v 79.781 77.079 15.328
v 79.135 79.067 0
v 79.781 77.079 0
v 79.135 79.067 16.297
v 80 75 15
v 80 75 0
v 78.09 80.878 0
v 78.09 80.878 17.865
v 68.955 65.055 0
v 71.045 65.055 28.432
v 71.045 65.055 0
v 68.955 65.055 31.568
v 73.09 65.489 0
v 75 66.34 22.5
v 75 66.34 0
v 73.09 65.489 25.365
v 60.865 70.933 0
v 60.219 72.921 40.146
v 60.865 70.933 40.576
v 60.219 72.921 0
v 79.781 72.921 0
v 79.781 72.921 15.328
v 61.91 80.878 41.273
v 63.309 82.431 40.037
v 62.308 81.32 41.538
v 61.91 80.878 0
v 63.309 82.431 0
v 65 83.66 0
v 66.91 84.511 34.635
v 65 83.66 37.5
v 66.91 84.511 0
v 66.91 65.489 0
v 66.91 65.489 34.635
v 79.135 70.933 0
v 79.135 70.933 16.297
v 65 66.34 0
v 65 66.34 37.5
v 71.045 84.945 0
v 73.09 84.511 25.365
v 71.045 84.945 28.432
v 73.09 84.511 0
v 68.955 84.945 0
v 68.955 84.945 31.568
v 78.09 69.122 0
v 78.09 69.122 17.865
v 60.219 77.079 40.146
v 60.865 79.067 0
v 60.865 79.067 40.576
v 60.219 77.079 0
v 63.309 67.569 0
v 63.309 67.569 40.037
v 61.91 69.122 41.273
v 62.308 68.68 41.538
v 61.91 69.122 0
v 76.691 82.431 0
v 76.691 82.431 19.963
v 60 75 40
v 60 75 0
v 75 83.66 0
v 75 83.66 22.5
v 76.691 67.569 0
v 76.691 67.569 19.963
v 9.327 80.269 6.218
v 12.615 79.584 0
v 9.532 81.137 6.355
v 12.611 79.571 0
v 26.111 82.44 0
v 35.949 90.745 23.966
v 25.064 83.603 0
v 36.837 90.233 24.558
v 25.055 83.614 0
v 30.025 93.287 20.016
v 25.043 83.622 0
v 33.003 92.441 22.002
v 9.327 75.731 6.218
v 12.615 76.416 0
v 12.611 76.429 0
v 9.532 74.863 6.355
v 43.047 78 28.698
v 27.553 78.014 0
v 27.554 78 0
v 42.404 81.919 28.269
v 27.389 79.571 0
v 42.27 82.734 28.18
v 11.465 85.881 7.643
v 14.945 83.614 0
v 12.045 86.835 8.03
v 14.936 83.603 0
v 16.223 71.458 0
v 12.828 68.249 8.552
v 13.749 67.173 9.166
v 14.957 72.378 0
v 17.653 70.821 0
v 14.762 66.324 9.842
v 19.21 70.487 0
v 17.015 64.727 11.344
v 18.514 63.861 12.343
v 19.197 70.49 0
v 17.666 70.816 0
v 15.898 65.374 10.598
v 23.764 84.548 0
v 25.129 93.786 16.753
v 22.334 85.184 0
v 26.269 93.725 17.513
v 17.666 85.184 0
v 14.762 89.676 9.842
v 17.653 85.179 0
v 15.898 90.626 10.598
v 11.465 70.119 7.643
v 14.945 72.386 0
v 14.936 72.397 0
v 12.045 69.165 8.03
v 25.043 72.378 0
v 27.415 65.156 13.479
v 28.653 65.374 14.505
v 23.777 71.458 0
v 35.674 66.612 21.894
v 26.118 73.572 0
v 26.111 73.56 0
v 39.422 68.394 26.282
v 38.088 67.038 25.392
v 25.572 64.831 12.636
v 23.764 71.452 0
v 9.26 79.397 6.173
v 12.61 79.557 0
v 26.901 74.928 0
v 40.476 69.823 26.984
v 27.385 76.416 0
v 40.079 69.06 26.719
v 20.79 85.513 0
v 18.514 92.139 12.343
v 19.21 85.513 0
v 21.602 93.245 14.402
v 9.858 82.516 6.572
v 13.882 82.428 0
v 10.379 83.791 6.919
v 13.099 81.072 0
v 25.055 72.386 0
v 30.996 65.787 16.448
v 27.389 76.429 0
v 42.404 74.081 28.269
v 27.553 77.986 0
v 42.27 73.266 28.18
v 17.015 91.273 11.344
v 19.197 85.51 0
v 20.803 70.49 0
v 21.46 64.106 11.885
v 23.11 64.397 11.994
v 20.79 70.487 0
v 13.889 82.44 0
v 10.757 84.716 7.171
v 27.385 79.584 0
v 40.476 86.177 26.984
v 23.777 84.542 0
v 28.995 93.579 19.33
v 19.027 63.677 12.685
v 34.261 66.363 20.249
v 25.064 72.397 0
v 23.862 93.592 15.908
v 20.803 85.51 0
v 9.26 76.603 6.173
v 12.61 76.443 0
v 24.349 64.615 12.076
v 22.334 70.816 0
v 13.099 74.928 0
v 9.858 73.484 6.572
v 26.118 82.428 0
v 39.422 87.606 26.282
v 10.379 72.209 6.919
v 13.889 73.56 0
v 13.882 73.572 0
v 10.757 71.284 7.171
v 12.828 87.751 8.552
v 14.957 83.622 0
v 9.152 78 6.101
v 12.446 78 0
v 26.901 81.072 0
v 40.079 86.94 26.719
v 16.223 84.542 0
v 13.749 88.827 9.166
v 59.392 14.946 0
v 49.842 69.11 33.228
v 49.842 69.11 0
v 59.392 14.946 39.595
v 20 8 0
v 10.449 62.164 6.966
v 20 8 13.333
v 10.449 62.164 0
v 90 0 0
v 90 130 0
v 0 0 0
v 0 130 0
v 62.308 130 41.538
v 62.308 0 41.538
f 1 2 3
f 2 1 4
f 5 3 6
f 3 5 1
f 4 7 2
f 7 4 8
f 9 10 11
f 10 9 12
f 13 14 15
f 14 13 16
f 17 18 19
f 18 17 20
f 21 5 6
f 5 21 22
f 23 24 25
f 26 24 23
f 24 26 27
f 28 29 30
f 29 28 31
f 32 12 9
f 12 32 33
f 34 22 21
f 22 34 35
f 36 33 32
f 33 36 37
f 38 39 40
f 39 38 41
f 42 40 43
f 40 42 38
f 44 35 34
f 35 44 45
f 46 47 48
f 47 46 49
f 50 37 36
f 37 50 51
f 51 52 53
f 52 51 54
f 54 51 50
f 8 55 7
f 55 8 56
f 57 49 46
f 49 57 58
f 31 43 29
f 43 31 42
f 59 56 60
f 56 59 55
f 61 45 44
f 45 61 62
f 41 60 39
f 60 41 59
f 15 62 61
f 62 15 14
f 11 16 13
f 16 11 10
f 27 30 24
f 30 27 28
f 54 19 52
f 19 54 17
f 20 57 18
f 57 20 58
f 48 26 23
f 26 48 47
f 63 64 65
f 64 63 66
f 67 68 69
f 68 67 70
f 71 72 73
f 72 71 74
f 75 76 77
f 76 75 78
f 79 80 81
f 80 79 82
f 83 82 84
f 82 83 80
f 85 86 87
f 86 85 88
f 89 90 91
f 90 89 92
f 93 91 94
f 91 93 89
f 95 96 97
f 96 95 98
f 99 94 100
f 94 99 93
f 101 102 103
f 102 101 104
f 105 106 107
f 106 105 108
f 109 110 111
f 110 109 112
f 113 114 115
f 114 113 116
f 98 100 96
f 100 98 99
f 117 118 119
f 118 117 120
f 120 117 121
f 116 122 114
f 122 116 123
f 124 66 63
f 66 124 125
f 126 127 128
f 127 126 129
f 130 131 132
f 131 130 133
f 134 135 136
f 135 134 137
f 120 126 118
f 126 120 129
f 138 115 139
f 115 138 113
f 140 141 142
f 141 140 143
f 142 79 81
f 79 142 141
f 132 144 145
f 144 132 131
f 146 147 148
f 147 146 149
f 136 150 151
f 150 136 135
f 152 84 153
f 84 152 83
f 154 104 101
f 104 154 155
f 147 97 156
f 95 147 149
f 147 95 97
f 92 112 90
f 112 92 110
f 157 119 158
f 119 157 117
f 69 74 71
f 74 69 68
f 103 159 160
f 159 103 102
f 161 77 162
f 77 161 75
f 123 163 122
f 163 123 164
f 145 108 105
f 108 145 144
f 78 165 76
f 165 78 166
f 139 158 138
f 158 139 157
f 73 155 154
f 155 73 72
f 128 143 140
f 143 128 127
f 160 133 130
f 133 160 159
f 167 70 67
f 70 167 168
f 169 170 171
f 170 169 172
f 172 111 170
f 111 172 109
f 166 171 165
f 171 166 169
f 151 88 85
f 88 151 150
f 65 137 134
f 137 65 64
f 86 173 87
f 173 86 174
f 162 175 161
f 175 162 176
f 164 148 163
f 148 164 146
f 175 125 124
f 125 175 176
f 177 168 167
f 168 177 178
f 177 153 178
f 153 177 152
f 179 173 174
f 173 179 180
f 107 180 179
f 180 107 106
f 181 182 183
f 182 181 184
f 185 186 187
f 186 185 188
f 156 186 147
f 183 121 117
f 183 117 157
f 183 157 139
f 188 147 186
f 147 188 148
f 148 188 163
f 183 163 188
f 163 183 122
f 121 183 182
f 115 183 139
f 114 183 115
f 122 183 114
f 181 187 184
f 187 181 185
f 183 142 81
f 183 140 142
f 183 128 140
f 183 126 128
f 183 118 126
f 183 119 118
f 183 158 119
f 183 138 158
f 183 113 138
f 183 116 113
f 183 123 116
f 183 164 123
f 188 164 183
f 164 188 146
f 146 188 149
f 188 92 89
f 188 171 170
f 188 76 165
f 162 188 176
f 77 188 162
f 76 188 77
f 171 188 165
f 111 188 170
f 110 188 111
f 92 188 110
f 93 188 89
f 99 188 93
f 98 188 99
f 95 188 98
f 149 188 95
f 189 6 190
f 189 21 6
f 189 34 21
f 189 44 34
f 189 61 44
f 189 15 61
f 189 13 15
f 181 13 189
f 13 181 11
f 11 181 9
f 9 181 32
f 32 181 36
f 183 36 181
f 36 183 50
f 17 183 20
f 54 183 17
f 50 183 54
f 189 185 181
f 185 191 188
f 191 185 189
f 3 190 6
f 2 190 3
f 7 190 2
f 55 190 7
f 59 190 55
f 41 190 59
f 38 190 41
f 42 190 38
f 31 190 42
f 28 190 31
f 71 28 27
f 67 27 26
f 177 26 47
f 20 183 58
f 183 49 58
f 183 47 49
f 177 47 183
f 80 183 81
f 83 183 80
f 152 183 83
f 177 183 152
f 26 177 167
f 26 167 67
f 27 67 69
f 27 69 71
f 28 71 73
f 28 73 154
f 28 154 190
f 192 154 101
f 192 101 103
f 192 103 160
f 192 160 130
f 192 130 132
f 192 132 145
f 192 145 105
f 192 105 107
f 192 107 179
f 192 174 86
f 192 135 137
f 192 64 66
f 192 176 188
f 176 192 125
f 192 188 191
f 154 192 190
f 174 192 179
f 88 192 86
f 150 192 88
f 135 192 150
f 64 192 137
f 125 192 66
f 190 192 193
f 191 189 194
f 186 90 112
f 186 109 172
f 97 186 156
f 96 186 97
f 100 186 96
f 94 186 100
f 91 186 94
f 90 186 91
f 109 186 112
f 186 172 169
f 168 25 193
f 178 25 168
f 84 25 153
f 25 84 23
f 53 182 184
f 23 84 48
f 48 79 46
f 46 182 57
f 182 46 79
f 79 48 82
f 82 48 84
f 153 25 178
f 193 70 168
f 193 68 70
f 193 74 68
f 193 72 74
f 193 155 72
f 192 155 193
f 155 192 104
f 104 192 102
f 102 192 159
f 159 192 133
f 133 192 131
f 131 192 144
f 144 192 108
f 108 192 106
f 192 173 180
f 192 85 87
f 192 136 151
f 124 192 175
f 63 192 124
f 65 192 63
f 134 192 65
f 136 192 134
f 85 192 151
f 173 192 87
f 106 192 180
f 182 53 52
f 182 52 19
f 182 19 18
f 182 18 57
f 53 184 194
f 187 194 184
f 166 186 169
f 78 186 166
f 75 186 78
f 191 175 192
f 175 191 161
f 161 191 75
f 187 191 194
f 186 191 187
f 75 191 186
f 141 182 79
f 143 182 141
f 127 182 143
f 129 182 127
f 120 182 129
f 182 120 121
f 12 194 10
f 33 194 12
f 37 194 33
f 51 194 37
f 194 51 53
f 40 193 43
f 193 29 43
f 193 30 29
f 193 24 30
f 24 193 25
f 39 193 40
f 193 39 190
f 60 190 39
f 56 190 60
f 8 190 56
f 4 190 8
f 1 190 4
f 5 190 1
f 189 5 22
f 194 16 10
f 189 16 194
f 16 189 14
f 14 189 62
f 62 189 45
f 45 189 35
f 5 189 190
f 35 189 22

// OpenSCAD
max_l=130;
max_w=90;
max_h=60;
pad=0.1;
padd=pad*2;

punch_d=20;
punch_r=punch_d/2;

io_d=15;
io_r=io_d/2;

io_d2=80;
io_r2=io_d2/2;

batt_w=40;
batt_l=55;
diff_h=max_h+padd;

difference() {
    cube([max_w,max_l,max_h]);
    translate([0,0,-pad]) {
        translate([70,75,0])
        cylinder(h=diff_h,r=punch_r);
        translate([20,78,0])
        cylinder(h=diff_h,r1=io_r,r2=io_r2);
        translate([20,8,0])
        rotate([0,0,10])
        cube([batt_w,batt_l,diff_h]);
    }
    translate([max_w,0,max_h])
    rotate([0,-atan(max_h/max_w),0])
    translate([-max_w*2+pad,-pad,0])
    cube([max_w*2,max_l+padd,max_h*2]);
    translate([max_w,0,0])
    rotate([0,-atan(max_h/max_w)+90,0])
    translate([-max_w*2+pad,-pad,0])
    cube([max_w*2,max_l+padd,max_h*2]);
}
